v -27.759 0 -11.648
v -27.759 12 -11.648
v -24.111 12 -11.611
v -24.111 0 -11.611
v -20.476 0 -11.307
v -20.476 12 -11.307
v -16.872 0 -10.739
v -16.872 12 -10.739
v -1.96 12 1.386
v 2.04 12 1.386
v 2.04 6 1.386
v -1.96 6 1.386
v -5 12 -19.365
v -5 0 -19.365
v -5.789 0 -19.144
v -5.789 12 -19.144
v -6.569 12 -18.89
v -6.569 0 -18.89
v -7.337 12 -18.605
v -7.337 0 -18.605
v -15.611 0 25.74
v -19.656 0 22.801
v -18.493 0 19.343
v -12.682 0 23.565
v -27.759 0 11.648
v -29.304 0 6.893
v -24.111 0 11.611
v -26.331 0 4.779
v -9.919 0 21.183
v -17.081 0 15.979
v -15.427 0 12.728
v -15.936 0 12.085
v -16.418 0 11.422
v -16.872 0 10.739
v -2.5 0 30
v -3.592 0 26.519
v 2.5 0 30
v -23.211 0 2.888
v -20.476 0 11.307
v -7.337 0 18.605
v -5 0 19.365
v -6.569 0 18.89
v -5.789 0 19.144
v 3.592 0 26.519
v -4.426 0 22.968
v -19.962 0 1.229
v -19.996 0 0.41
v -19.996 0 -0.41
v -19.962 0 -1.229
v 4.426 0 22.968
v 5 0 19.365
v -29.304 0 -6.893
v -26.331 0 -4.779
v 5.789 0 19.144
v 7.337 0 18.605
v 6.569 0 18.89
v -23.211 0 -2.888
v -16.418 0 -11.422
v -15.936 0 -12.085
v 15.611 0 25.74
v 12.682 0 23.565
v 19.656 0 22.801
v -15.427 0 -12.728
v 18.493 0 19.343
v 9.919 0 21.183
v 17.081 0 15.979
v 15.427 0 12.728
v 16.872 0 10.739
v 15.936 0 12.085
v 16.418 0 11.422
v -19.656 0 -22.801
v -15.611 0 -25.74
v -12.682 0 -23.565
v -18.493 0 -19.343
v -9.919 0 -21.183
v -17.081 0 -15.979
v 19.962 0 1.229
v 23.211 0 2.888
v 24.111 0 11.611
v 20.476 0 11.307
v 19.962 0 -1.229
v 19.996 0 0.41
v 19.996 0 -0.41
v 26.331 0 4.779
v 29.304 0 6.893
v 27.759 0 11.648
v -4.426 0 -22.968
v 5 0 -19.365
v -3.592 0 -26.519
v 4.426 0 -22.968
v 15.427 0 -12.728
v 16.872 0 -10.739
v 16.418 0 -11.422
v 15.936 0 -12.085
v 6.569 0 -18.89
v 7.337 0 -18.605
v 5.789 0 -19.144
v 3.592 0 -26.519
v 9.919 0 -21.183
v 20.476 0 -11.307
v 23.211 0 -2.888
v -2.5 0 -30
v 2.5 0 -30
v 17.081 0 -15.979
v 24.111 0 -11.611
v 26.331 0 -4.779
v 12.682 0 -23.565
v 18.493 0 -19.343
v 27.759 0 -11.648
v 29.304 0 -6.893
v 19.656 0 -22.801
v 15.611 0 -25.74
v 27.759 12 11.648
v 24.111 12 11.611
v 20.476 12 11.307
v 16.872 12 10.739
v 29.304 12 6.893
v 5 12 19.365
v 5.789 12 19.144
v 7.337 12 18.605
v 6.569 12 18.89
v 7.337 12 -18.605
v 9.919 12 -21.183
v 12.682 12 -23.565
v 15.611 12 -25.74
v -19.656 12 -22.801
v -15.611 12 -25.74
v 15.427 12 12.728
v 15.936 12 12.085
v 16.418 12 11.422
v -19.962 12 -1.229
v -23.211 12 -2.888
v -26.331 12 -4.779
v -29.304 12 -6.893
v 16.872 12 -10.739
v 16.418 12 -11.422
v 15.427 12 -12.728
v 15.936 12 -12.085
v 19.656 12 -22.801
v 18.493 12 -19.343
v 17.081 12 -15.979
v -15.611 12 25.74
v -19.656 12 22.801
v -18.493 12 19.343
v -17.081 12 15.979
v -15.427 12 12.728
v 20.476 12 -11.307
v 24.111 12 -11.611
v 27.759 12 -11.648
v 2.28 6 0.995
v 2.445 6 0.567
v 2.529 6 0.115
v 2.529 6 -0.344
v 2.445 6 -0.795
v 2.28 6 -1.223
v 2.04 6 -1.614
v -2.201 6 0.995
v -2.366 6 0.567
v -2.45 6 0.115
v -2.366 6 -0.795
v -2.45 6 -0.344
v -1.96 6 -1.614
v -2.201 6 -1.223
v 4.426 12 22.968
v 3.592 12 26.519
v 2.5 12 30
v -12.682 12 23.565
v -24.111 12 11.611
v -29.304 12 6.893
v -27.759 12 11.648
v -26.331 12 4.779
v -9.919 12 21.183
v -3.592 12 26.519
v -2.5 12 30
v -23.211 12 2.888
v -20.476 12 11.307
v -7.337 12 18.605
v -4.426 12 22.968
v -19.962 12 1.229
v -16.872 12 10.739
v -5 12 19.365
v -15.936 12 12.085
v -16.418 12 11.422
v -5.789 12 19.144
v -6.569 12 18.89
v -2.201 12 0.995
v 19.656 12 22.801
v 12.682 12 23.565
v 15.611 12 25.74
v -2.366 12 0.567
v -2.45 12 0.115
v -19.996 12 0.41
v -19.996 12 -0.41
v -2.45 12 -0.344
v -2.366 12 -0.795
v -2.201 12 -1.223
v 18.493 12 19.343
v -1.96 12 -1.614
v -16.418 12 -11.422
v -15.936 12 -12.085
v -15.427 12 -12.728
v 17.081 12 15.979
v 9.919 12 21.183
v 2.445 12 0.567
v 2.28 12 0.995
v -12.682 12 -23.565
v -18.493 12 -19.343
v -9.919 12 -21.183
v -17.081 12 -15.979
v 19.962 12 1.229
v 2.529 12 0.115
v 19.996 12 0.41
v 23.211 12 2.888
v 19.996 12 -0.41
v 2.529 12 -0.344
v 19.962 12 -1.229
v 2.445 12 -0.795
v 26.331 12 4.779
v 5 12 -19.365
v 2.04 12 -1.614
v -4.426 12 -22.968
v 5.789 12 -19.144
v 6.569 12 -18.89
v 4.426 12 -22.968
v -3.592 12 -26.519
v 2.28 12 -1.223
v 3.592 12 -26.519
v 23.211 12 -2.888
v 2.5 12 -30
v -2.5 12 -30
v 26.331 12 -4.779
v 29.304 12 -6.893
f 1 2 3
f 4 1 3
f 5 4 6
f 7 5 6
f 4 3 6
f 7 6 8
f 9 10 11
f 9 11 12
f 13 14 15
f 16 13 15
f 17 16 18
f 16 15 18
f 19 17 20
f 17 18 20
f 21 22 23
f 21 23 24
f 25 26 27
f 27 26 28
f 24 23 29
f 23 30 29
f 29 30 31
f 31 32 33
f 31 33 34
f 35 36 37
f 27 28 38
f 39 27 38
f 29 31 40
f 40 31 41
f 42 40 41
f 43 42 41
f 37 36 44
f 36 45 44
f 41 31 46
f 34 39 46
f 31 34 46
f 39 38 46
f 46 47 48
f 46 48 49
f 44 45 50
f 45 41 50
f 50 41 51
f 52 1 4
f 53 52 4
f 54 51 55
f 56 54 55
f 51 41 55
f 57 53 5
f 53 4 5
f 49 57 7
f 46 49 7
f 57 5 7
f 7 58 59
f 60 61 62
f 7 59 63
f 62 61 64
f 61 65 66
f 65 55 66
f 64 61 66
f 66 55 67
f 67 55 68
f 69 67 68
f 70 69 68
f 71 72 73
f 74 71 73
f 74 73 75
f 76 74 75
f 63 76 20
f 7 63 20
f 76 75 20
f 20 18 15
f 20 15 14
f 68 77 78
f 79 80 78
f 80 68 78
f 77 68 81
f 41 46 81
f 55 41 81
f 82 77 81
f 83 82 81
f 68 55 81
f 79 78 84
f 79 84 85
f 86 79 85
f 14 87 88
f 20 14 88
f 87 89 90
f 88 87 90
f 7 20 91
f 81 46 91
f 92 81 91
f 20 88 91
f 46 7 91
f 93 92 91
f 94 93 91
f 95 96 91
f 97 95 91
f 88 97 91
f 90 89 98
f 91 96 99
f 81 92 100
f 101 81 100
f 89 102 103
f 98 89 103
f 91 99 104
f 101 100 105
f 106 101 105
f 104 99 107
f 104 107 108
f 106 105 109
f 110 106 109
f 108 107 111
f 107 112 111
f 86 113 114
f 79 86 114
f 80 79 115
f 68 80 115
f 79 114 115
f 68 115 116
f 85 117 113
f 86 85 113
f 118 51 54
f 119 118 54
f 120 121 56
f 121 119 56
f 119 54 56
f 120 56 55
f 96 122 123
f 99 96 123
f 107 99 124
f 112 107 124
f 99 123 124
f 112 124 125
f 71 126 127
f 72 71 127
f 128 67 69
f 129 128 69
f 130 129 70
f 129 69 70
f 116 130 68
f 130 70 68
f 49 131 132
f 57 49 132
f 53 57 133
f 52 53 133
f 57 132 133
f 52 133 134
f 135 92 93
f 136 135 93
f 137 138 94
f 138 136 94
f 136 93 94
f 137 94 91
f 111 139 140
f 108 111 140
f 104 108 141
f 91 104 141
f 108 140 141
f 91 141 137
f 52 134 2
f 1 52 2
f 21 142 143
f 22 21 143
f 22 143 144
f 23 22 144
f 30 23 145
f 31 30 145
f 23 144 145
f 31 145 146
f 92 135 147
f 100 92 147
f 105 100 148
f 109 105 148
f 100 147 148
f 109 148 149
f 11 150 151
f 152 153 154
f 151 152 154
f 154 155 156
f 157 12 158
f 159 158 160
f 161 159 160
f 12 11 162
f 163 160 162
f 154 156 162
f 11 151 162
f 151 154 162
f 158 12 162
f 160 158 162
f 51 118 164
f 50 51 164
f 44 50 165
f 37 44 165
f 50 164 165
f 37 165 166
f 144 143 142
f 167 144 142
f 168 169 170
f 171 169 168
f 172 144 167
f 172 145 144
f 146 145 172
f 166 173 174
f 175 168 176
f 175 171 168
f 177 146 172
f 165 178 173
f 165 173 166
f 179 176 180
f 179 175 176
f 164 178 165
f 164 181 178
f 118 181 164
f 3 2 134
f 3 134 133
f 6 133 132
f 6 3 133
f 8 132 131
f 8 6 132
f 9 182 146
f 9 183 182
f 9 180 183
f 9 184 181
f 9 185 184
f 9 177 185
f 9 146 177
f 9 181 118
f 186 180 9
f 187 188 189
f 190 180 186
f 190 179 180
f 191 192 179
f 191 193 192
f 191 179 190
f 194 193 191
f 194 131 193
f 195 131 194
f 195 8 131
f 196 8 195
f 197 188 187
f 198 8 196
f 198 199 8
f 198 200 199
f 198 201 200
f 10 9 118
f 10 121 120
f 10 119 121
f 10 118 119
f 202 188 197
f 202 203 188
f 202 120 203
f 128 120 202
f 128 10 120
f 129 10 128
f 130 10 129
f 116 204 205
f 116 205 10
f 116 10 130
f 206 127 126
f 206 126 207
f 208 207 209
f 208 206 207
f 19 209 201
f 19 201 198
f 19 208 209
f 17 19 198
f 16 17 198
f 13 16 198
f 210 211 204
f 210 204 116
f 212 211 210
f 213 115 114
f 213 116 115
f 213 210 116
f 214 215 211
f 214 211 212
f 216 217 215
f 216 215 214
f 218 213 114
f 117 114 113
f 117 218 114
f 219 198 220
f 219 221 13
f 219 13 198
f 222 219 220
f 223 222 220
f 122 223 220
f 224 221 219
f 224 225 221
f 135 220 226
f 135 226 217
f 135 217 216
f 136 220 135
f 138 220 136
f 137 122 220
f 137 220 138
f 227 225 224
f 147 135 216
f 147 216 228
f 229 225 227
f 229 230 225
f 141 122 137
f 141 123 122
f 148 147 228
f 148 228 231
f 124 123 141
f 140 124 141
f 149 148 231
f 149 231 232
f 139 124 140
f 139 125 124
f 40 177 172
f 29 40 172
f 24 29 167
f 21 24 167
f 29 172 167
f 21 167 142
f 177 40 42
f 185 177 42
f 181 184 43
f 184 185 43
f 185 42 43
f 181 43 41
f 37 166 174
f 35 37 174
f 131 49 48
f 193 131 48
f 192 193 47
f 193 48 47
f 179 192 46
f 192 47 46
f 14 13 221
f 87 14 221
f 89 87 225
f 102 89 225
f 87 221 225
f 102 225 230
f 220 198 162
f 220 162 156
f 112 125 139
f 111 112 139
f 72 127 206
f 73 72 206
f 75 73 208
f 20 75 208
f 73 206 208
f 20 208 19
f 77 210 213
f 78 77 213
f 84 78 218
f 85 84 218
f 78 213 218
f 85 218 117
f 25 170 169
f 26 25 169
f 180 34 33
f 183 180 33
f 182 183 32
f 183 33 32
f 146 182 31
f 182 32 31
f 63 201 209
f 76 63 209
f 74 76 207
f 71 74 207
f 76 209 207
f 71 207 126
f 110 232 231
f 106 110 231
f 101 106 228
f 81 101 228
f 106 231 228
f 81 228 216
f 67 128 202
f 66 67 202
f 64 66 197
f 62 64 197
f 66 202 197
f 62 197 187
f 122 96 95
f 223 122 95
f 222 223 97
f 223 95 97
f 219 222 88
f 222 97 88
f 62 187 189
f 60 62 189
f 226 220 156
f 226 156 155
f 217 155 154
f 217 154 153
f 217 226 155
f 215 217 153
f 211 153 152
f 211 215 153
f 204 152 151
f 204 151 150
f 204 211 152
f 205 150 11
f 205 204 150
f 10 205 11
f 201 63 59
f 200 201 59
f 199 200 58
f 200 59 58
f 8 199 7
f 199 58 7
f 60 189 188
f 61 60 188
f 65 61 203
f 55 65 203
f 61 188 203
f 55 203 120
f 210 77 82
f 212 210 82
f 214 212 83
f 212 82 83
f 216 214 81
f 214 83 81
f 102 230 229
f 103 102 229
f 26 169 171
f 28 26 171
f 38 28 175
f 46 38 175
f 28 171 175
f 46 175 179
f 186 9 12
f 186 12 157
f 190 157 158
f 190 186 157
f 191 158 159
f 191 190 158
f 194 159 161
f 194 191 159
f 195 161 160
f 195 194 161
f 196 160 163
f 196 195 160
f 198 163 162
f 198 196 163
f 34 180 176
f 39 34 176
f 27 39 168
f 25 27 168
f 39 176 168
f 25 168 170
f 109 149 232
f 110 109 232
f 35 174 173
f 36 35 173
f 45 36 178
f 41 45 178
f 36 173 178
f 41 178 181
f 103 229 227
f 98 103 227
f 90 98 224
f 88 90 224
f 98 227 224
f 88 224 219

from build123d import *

# Parameters (mm, degrees)
SKETCH1_R           = 20
BOSS_EXTRUDE1_DEPTH = 12
CUT_EXTRUDE1_DEPTH  = 6
BOSS_EXTRUDE2_DEPTH = 12
CIRPATTERN2_COUNT   = 10


with BuildPart() as part:
    # Sketch1 → Boss-Extrude1 (new body)
    with BuildSketch(Plane(origin=(0, 0, 0), x_dir=(1, 0, 0), z_dir=(0, 1, 0))):
        Circle(SKETCH1_R)
    extrude(amount=BOSS_EXTRUDE1_DEPTH)

    # Sketch2 → Cut-Extrude1 (cut)
    with BuildSketch(Plane(origin=(0, 12, 0), x_dir=(1, 0, 0), z_dir=(0, 1, 0))):
        with BuildLine():
            Line((-1.960372744, 1.614176032), (2.039627256, 1.614176032))
            ThreePointArc((2.039627256, 1.614176032), (2.539627256, 0.114176032), (2.039627256, -1.385823968))
            Line((2.039627256, -1.385823968), (-1.960372744, -1.385823968))
            ThreePointArc((-1.960372744, -1.385823968), (-2.460372744, 0.114176032), (-1.960372744, 1.614176032))
        make_face()
    extrude(amount=-CUT_EXTRUDE1_DEPTH, mode=Mode.SUBTRACT)

    # Sketch4 → Boss-Extrude2 (add)
    with BuildSketch(Plane(origin=(0, 12, 0), x_dir=(1, 0, 0), z_dir=(0, 1, 0))):
        with BuildLine():
            Line((-2.5, 30), (2.5, 30))
            ThreePointArc((2.5, 30), (4.041341884, 24.750944403), (5, 19.364916731))
            ThreePointArc((5, 19.364916731), (0, 20), (-5, 19.364916731))
            ThreePointArc((-5, 19.364916731), (-4.041341884, 24.750944403), (-2.5, 30))
        make_face()
    boss_extrude2 = extrude(amount=-BOSS_EXTRUDE2_DEPTH)

    # CirPattern2: Boss-Extrude2 ×10 about axis
    cirpattern2_axis = Axis((0, 0, 0), (0, 1, 0))
    for i in range(1, CIRPATTERN2_COUNT):
        add(boss_extrude2.rotate(cirpattern2_axis, i * 360 / CIRPATTERN2_COUNT))


solid = part.part
